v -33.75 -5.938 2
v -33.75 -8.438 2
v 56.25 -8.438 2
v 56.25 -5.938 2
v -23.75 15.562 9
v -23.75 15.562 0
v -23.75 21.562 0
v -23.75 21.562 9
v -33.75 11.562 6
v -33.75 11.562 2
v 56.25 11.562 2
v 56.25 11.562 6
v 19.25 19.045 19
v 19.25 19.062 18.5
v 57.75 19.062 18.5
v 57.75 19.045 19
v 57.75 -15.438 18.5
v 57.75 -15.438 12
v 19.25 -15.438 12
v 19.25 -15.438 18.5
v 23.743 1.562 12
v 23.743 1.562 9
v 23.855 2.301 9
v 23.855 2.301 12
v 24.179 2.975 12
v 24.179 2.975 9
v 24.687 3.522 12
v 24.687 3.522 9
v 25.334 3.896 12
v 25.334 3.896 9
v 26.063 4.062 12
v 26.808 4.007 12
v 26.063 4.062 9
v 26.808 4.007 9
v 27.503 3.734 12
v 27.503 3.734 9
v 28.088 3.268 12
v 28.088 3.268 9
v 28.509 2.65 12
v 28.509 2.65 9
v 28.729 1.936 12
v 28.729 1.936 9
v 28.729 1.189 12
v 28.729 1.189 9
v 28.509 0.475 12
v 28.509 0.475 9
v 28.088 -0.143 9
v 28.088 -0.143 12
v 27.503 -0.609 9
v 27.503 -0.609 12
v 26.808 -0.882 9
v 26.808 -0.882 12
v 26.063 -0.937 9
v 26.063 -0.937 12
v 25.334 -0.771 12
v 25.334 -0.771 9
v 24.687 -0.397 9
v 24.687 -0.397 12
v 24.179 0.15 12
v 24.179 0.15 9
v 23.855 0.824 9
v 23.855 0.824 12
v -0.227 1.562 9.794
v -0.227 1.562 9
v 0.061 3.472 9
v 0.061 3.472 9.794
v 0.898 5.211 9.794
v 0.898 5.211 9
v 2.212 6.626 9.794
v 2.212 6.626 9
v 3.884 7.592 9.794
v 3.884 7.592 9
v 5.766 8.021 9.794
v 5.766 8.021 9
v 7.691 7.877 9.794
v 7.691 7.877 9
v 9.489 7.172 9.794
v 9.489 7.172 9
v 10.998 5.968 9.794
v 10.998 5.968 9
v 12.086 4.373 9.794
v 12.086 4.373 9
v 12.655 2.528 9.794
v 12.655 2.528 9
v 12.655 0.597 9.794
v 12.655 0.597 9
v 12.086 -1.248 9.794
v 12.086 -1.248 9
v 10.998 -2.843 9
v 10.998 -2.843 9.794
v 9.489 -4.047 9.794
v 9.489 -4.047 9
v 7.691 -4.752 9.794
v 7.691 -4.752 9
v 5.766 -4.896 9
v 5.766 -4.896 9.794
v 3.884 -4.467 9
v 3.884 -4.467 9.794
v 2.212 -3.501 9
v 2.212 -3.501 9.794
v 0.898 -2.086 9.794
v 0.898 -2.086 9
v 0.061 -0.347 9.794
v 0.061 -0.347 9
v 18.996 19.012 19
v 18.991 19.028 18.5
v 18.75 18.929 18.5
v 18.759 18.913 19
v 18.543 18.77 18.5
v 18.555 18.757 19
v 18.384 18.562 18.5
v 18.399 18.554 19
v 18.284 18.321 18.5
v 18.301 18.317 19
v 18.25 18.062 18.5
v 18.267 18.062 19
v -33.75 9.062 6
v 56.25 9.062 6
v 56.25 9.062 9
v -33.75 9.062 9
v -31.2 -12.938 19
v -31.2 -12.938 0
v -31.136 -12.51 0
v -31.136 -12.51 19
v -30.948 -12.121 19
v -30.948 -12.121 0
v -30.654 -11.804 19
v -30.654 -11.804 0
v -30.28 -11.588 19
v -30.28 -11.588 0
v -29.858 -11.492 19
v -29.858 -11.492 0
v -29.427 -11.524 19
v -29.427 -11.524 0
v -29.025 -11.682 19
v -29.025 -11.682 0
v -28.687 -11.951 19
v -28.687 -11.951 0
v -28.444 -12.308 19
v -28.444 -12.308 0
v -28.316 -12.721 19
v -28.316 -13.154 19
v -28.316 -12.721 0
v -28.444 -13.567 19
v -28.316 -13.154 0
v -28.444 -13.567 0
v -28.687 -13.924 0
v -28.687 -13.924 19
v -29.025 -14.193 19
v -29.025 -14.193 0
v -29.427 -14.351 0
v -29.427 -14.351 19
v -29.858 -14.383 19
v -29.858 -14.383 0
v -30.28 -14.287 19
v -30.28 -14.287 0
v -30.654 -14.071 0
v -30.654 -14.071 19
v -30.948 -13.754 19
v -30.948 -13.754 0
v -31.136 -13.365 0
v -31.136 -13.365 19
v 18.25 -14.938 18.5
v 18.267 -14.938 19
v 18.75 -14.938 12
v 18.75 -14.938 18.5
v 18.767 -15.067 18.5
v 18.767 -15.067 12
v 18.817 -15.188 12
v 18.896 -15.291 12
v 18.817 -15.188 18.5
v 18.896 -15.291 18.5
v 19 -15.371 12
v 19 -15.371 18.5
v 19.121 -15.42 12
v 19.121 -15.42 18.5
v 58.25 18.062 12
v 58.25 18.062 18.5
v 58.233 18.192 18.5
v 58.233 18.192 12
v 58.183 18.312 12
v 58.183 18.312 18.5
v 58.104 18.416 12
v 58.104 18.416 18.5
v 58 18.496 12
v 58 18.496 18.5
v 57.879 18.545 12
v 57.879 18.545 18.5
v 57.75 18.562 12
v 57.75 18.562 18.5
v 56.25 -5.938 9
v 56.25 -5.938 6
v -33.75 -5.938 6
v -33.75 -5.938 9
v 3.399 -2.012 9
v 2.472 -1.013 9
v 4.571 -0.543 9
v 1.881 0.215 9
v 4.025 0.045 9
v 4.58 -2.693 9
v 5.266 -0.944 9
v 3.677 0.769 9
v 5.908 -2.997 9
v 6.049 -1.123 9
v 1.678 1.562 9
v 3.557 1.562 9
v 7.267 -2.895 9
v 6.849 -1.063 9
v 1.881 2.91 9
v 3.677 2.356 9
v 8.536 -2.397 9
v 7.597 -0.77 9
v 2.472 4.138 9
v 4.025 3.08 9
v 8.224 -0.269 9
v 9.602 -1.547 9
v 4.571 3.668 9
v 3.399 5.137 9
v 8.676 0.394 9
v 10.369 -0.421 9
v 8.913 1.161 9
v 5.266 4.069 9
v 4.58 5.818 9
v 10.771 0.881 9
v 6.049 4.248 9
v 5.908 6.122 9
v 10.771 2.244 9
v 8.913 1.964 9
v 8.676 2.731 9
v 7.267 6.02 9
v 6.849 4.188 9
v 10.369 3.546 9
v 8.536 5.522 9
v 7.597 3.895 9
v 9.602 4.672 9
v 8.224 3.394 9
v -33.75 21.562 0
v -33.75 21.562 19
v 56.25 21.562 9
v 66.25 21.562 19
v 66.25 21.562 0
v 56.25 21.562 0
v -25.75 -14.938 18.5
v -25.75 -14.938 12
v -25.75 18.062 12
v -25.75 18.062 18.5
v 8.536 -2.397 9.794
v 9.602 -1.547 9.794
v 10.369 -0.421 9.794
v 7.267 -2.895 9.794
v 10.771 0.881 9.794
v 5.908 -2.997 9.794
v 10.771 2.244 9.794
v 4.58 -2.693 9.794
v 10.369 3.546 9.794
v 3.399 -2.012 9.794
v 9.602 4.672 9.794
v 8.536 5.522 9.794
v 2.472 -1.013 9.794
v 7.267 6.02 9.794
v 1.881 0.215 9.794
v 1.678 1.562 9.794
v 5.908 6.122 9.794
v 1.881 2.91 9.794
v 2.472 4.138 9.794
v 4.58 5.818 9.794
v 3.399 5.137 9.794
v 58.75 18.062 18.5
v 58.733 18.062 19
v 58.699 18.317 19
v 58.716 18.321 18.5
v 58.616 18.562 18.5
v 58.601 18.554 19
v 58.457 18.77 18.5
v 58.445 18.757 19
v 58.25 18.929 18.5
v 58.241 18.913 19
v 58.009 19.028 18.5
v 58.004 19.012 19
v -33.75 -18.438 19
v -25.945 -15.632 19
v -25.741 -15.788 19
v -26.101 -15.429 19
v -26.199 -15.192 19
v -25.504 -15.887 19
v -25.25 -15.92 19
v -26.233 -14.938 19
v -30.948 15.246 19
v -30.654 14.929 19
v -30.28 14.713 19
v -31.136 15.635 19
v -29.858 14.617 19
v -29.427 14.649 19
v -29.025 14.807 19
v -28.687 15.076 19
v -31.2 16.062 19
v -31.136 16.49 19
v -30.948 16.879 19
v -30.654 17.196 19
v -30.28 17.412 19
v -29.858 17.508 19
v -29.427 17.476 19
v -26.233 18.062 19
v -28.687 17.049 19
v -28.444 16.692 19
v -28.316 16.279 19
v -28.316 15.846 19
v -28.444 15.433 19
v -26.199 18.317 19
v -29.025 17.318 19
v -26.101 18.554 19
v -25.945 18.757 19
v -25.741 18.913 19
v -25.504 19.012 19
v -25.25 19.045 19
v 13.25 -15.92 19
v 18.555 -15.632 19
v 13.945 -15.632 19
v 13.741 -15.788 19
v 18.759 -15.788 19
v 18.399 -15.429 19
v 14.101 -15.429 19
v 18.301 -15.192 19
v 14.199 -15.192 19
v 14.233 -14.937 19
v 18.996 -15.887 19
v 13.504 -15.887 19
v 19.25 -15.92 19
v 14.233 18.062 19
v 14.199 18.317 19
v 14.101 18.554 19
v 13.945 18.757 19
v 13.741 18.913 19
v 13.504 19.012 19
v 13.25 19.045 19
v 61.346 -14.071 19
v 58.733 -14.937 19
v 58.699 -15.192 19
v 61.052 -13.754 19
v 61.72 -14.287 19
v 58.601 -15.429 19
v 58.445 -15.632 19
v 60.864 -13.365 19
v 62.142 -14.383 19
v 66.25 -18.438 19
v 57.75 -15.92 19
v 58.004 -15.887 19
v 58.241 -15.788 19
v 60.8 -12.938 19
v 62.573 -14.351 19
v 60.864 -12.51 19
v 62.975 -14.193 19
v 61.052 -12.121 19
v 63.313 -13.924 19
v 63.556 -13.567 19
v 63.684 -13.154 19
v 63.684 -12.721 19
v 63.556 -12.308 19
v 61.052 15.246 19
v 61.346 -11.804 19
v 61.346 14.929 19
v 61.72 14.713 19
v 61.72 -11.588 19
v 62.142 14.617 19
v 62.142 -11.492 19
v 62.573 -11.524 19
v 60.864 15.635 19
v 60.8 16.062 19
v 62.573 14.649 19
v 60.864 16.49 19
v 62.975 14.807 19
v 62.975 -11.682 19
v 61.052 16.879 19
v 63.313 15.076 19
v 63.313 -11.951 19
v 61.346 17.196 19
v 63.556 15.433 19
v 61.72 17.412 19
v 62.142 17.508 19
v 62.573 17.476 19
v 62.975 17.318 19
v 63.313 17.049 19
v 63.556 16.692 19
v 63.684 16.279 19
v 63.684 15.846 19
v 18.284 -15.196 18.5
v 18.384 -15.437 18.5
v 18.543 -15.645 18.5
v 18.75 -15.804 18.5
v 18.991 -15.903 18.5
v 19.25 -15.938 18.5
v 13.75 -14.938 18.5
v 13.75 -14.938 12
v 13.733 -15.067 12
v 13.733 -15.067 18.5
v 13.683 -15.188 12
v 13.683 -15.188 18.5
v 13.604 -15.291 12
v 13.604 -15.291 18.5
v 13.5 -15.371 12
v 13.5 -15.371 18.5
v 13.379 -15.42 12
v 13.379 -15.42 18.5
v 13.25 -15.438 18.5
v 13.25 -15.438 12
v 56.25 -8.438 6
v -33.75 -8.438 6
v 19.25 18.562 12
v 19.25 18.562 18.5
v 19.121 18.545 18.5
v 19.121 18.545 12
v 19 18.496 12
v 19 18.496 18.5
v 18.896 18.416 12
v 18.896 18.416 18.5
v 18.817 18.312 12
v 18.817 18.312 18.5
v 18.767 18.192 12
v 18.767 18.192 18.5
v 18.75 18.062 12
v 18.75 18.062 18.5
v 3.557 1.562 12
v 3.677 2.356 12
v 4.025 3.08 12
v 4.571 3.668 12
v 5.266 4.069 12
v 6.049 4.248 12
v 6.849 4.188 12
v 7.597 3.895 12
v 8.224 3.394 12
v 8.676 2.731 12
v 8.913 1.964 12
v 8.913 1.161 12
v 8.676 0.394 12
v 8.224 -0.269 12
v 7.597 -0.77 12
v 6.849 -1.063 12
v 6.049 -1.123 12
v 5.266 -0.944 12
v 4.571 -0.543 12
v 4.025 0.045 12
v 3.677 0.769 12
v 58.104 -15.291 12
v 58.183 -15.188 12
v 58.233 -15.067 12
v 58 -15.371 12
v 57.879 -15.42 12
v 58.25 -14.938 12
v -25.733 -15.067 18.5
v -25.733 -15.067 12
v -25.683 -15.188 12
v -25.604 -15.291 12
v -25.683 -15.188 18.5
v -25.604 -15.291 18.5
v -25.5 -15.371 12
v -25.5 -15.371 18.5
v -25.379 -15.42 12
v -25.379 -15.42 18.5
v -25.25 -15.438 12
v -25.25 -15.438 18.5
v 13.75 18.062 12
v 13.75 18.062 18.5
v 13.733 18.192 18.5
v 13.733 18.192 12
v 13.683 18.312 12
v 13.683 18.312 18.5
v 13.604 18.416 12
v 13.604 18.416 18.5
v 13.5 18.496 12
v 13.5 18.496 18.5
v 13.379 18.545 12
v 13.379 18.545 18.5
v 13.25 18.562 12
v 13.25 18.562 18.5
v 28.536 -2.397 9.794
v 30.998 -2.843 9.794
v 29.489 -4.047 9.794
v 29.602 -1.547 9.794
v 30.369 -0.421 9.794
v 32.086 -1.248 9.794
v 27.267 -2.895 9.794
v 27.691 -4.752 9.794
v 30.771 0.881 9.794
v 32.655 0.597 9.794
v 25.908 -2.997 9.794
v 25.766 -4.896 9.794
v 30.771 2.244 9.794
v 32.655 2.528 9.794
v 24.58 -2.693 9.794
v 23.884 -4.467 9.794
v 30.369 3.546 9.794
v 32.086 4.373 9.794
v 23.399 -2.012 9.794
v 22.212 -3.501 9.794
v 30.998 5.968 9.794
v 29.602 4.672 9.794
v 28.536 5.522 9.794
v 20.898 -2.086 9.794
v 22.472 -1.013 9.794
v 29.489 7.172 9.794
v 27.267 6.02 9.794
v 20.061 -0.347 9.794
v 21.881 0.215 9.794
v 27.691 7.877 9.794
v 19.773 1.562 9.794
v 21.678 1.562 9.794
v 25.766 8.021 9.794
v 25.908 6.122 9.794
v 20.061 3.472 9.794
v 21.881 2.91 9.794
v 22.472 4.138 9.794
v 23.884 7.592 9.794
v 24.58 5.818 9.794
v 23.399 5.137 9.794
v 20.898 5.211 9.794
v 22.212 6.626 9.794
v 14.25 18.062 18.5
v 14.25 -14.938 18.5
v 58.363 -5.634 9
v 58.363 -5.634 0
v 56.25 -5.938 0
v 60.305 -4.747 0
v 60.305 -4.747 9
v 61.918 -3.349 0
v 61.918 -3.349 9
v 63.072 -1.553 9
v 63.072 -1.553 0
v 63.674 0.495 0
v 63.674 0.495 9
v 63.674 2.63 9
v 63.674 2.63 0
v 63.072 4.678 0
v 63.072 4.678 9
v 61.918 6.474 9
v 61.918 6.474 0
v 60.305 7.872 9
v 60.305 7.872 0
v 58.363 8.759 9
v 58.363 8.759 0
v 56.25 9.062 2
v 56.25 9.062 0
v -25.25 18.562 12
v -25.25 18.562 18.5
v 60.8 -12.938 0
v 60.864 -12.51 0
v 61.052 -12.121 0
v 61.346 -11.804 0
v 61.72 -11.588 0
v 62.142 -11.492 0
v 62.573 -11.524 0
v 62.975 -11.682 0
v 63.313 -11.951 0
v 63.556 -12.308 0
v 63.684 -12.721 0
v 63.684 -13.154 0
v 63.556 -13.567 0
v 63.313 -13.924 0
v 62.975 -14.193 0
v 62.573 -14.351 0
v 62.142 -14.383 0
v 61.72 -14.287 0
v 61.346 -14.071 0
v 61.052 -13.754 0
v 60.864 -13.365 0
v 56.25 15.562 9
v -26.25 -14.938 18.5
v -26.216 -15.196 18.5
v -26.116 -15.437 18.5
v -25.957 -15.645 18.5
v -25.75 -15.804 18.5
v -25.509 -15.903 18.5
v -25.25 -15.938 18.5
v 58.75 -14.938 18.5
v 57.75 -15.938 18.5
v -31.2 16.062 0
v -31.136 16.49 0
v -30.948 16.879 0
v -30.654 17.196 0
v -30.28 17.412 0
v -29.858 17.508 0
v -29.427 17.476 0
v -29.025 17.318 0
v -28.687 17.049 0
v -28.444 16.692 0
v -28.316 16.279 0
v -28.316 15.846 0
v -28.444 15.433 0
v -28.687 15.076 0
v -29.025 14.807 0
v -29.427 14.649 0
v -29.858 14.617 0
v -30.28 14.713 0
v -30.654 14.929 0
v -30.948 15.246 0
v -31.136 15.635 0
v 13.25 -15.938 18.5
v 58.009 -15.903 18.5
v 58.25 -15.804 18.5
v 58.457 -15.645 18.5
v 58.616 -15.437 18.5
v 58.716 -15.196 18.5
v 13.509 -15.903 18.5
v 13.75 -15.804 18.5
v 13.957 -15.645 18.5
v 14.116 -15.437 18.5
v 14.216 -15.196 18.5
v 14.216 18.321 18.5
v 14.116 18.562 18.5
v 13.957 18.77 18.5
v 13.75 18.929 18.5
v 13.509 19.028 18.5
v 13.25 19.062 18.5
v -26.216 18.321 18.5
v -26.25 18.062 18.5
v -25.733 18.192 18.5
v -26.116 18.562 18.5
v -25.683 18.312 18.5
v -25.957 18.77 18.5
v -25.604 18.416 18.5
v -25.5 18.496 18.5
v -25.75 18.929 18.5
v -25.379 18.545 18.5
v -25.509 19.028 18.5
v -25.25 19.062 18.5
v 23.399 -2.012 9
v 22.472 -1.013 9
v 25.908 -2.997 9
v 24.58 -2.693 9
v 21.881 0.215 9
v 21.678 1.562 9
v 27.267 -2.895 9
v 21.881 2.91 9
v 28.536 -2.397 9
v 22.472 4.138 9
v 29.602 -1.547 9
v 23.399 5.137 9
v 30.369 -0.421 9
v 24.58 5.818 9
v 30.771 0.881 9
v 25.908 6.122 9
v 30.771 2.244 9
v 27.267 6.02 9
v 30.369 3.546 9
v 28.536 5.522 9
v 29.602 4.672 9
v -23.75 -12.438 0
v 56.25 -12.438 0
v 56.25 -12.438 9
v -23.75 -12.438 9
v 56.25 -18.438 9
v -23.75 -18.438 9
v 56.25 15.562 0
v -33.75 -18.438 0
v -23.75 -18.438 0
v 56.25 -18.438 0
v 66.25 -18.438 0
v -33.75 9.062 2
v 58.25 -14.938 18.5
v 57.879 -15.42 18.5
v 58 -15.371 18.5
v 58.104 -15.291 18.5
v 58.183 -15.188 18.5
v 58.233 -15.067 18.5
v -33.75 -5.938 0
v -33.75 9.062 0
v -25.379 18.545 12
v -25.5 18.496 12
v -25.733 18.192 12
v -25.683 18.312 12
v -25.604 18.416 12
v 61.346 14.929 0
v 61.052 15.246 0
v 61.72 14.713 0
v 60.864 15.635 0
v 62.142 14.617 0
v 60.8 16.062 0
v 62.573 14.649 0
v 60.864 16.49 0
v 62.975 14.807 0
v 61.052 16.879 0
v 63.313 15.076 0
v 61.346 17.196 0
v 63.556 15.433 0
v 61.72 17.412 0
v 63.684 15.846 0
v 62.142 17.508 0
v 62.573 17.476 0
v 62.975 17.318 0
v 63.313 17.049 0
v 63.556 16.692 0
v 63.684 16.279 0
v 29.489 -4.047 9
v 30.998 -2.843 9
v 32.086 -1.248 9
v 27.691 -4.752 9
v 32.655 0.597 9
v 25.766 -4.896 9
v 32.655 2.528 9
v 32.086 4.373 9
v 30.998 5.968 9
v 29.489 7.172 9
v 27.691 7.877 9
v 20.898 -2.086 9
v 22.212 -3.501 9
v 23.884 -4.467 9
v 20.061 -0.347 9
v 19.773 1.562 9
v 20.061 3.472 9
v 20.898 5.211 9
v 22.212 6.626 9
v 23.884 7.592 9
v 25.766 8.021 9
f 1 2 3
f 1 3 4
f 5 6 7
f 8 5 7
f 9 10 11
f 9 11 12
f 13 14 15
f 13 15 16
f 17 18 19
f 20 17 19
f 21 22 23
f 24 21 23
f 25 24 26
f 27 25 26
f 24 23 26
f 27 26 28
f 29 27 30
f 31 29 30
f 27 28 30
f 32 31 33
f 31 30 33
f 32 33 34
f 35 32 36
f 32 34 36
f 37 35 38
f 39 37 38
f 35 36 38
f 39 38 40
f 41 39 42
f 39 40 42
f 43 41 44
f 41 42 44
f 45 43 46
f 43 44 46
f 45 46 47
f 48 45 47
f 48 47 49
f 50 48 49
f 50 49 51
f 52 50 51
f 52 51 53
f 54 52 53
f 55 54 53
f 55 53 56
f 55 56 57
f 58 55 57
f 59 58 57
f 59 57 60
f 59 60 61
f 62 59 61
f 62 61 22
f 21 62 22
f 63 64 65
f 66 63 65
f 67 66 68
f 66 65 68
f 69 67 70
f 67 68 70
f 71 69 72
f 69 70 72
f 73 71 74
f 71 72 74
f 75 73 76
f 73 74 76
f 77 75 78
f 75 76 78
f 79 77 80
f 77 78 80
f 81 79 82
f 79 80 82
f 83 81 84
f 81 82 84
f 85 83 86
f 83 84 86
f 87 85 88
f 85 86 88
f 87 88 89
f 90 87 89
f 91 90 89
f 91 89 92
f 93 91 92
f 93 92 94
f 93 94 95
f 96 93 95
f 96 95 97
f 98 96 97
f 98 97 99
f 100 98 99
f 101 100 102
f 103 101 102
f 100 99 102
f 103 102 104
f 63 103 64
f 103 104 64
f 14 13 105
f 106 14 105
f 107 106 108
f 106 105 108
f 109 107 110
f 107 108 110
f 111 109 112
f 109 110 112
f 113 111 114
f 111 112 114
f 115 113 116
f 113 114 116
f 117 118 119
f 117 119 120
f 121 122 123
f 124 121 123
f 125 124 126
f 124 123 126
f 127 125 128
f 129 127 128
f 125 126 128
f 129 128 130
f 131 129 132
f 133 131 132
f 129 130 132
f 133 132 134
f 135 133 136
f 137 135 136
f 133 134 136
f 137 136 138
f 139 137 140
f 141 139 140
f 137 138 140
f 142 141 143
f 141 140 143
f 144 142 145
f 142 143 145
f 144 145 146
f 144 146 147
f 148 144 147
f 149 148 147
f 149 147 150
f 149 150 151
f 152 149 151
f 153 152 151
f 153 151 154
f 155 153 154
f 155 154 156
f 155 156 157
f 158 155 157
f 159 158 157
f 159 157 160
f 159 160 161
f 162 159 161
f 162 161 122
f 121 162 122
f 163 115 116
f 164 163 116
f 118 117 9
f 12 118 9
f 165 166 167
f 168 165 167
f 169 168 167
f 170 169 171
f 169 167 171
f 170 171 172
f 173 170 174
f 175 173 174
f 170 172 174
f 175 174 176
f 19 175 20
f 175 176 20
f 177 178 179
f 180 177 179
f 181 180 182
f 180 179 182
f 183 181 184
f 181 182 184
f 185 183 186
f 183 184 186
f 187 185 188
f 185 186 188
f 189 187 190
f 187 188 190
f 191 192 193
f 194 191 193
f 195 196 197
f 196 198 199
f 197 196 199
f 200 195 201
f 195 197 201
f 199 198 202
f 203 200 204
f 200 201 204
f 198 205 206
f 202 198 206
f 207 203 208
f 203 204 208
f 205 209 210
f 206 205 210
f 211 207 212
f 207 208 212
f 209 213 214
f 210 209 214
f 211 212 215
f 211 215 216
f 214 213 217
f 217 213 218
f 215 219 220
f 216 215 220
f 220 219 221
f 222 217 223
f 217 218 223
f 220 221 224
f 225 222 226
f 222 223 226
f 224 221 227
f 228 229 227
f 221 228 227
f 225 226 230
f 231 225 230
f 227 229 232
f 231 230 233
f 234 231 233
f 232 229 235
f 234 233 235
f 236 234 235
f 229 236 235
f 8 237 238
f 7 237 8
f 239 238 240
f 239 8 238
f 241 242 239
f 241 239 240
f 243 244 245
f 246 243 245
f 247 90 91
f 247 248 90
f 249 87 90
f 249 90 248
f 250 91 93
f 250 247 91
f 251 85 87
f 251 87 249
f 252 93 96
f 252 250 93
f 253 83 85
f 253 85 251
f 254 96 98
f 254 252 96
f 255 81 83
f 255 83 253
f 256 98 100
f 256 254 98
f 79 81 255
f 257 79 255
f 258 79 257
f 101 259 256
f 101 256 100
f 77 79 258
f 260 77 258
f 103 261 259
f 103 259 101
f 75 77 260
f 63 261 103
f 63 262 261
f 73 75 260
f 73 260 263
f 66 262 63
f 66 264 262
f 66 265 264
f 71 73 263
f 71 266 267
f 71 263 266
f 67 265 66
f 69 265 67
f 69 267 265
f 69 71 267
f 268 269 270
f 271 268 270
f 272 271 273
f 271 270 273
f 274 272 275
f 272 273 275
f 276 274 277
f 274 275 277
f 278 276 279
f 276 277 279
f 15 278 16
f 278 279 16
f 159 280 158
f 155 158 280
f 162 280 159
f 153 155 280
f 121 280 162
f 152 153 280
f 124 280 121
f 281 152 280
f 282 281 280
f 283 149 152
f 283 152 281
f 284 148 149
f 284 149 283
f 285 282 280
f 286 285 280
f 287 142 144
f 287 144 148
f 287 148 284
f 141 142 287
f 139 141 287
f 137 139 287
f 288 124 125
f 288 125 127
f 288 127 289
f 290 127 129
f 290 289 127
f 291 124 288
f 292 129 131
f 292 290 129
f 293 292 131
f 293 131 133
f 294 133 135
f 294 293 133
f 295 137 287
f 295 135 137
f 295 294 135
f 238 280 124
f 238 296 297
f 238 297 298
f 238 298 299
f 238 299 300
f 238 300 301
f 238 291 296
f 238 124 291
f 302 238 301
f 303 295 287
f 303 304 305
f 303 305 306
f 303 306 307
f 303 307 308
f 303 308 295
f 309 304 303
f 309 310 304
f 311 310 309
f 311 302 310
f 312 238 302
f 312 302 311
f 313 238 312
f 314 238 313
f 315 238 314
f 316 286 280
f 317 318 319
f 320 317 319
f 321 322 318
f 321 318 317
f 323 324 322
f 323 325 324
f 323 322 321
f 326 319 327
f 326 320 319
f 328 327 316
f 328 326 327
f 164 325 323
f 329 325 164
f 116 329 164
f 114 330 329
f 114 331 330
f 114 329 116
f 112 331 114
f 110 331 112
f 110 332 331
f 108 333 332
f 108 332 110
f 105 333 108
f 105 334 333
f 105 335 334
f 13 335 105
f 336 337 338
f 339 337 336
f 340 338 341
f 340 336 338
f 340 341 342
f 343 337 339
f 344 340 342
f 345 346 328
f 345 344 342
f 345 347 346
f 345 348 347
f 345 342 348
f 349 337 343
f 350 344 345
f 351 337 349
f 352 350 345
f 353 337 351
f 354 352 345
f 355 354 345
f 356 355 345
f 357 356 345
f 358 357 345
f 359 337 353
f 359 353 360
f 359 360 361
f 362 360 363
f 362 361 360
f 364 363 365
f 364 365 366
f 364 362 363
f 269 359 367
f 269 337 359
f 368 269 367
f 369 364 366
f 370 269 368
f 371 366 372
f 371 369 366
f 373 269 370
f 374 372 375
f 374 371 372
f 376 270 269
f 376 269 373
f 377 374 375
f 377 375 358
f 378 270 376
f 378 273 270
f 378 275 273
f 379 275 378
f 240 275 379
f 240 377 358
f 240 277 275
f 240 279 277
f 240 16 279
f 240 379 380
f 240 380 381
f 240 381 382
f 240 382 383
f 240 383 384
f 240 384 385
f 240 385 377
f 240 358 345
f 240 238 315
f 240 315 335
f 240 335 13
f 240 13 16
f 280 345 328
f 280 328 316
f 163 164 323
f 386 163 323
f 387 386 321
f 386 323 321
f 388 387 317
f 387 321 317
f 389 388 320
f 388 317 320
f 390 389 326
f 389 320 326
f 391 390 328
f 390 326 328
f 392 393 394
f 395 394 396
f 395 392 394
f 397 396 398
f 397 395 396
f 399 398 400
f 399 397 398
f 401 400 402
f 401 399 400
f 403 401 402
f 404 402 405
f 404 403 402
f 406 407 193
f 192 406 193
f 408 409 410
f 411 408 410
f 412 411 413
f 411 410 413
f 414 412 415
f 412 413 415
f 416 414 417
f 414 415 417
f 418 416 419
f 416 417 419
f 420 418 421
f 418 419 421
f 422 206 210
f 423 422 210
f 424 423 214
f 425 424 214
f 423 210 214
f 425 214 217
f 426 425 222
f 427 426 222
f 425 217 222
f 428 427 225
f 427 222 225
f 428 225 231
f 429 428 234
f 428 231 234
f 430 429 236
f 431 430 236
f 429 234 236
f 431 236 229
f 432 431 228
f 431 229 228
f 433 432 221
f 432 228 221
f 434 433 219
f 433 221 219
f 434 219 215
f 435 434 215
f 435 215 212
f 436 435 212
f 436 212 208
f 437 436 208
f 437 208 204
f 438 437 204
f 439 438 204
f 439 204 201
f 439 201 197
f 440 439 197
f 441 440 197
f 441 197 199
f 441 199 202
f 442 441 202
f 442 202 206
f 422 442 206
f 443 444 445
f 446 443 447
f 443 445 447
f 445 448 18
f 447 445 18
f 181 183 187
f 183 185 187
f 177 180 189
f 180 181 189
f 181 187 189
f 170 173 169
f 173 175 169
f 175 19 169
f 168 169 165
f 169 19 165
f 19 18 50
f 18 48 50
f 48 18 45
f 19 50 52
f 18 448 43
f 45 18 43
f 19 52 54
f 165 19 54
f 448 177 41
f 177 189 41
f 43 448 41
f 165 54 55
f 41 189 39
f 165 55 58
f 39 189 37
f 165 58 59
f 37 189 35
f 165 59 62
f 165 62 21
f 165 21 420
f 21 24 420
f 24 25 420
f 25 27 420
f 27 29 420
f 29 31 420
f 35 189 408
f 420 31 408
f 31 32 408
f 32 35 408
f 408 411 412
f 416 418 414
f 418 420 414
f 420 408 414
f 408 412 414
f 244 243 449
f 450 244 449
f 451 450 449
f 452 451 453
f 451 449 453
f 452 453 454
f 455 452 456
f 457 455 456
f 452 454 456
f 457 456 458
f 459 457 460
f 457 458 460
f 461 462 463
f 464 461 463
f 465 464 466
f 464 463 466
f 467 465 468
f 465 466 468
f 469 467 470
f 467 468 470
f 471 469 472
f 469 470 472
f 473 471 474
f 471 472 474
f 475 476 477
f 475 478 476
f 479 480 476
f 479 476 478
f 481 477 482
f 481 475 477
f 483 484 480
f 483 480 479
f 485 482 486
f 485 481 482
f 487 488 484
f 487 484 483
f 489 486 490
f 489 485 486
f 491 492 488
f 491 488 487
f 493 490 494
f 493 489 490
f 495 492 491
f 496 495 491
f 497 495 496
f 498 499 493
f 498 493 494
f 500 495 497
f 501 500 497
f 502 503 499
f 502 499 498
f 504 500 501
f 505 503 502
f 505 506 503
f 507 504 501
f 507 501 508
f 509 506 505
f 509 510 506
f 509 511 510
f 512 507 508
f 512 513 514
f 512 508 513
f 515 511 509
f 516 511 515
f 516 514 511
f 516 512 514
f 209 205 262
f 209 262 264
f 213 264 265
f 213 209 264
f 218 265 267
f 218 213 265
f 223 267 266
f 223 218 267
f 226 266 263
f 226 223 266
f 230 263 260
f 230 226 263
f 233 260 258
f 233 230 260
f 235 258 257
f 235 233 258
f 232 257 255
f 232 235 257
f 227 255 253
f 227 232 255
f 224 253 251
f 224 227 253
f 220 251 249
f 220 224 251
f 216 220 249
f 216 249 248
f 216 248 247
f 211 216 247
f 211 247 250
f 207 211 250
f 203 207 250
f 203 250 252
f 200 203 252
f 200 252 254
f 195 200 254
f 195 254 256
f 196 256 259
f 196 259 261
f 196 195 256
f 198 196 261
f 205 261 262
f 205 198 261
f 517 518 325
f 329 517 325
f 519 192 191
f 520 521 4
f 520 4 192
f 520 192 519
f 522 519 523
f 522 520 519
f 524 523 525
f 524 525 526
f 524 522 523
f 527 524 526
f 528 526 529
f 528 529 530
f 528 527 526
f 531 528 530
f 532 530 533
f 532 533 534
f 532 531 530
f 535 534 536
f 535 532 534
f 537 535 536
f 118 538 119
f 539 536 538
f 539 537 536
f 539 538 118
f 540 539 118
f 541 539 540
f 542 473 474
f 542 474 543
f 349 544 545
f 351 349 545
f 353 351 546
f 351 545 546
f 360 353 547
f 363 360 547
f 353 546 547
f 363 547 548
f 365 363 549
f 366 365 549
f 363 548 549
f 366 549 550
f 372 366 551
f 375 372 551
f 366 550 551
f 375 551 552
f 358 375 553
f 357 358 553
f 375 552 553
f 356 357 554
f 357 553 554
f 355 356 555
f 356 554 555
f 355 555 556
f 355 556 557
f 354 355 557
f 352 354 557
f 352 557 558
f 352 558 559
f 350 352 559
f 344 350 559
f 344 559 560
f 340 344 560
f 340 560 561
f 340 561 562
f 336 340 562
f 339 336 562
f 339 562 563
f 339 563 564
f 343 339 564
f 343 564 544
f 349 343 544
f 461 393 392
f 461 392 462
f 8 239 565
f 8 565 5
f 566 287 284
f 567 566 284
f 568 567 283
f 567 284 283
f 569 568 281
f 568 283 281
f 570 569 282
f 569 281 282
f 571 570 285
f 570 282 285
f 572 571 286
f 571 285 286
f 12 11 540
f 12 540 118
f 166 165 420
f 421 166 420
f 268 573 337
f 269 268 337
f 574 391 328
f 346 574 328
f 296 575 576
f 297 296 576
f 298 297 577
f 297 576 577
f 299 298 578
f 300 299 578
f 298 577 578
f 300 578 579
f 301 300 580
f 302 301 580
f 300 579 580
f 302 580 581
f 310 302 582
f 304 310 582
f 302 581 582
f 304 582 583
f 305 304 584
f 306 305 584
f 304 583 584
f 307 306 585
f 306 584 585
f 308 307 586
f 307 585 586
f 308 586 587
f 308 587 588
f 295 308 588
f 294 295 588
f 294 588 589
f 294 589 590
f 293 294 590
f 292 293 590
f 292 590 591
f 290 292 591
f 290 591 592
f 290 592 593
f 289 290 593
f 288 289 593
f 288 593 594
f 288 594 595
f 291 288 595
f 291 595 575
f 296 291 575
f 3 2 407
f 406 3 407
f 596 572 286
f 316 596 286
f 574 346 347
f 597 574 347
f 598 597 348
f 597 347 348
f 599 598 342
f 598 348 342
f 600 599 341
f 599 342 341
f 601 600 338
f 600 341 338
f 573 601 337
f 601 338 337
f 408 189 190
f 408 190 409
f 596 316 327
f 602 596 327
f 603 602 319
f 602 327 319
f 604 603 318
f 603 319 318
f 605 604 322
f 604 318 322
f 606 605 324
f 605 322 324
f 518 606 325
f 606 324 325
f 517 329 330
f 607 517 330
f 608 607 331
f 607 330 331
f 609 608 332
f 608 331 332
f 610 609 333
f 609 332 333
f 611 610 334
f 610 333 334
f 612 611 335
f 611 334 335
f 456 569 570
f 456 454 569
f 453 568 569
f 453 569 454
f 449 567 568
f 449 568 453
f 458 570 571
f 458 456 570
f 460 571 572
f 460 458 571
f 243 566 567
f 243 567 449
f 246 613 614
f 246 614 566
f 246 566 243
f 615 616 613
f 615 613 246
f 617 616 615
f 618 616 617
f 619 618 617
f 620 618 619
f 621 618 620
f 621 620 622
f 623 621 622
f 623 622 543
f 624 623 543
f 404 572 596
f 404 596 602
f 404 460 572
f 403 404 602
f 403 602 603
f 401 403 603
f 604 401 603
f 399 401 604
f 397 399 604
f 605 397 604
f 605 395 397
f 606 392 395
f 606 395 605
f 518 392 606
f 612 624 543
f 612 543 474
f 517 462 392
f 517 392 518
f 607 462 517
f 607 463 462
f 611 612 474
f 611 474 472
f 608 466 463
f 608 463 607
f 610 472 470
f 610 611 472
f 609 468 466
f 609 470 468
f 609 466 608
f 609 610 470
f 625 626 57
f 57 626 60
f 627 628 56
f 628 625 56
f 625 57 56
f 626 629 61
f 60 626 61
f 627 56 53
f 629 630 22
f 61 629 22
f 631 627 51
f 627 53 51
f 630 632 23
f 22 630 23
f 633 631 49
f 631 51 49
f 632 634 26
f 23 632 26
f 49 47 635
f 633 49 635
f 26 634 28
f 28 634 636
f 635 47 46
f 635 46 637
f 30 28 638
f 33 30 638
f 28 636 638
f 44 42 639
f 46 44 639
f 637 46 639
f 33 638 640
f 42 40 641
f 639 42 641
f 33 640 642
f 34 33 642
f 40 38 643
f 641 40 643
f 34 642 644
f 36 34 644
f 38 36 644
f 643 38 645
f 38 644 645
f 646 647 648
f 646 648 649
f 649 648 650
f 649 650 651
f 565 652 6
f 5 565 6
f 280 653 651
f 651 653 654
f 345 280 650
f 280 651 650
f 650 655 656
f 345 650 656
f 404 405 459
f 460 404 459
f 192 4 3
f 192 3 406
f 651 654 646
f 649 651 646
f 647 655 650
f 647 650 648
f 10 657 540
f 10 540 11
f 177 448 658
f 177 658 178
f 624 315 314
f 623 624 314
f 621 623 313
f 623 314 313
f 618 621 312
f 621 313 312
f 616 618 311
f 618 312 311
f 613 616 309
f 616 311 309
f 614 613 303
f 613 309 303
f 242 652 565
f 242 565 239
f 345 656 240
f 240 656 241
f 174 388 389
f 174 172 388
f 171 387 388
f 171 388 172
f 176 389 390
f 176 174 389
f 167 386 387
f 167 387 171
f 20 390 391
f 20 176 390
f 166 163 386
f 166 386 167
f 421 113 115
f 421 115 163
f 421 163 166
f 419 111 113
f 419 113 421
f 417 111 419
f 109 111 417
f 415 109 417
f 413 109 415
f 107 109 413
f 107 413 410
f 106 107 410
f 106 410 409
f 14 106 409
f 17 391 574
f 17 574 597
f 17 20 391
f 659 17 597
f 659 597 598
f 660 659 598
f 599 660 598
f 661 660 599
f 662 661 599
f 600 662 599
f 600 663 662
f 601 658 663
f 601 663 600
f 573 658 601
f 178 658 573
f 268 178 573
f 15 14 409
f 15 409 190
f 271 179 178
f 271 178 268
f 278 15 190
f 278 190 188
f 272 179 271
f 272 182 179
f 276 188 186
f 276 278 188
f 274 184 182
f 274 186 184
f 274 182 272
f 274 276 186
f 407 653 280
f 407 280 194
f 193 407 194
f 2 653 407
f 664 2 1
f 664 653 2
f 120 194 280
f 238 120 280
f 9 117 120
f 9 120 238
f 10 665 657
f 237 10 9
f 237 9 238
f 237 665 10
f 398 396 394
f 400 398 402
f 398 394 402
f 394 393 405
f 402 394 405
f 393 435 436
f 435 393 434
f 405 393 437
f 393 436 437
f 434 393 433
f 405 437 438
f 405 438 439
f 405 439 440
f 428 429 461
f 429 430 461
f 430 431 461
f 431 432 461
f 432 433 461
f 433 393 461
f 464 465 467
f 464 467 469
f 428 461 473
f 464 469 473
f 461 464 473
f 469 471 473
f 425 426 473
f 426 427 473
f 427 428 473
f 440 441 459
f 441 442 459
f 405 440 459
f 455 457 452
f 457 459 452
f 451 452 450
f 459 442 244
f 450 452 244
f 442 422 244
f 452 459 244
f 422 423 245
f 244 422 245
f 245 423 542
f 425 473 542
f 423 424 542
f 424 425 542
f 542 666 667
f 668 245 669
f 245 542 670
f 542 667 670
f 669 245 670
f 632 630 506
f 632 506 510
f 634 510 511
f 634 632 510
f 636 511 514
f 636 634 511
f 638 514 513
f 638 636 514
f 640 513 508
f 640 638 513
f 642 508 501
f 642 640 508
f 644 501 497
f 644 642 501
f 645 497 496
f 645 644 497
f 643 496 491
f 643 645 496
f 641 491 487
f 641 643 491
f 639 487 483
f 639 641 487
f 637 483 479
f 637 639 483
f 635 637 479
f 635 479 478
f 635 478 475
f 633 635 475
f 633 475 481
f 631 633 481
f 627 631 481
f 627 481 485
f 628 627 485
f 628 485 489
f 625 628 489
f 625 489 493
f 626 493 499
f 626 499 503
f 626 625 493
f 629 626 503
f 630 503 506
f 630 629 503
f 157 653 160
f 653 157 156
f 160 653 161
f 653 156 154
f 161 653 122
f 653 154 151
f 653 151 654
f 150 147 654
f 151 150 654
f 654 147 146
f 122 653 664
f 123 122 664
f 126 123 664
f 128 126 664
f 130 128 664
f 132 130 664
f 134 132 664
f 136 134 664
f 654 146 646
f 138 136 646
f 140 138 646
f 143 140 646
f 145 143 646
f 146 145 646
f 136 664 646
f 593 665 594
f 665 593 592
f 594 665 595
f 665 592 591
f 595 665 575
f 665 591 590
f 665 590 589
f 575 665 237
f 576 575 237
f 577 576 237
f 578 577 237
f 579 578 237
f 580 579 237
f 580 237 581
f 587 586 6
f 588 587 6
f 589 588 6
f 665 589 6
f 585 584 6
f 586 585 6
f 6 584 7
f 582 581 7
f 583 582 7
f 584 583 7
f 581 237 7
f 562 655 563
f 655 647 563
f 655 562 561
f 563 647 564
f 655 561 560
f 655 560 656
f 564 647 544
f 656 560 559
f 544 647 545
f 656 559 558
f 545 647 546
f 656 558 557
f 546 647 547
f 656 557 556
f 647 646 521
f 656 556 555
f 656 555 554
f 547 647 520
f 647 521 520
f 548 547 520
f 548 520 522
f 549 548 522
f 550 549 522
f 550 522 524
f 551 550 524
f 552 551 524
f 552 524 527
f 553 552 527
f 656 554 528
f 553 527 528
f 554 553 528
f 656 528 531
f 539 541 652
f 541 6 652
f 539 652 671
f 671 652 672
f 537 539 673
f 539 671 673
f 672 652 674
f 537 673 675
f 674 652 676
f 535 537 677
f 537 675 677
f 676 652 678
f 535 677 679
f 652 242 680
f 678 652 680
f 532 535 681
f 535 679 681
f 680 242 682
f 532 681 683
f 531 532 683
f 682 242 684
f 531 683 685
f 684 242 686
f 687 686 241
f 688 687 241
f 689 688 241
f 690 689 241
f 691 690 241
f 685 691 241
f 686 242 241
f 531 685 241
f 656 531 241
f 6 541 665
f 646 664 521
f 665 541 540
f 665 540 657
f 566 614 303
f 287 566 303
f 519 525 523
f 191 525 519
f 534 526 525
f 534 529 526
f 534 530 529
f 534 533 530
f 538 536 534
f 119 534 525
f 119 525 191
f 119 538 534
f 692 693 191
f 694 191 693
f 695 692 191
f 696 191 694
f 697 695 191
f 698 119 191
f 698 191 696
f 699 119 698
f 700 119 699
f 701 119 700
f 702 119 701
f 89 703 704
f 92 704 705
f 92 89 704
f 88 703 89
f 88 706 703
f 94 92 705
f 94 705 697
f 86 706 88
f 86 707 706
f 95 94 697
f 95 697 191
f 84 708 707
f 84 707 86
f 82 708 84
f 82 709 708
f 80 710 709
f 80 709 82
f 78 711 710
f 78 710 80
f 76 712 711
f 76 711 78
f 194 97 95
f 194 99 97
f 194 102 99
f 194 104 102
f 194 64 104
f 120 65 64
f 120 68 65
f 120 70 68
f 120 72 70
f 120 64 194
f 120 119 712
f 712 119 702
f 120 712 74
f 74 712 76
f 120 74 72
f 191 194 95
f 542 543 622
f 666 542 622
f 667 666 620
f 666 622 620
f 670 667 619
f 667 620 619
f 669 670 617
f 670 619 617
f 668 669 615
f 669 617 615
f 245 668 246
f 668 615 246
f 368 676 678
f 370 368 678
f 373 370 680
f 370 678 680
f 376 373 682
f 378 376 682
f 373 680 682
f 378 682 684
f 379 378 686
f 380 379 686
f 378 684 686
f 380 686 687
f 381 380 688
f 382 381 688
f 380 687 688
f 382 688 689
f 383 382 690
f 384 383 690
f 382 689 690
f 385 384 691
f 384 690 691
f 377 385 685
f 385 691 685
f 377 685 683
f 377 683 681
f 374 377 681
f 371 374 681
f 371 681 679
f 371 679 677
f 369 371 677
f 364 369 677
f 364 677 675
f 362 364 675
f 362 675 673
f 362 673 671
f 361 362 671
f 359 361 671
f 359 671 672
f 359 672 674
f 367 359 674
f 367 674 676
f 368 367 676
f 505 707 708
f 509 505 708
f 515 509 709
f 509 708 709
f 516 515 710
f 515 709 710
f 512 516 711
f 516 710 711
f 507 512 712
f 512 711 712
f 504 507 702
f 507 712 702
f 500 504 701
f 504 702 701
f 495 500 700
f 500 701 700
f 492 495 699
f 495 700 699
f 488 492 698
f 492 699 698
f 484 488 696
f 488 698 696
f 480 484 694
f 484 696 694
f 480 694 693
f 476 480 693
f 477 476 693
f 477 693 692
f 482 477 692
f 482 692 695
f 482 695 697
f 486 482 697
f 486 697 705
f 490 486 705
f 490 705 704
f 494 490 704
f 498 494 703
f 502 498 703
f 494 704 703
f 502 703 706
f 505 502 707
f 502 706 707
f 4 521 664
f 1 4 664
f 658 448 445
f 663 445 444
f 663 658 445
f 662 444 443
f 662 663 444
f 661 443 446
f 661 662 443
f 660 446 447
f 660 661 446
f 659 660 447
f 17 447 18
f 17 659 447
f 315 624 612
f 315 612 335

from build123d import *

# Parameters (mm, degrees)
SKETCH1_W           = 100
SKETCH1_H           = 40
BOSS_EXTRUDE1_DEPTH = 38
CUT_EXTRUDE2_START  = -12
SKETCH2_W           = 39.5
SKETCH2_H           = 34
CUT_EXTRUDE2_DEPTH  = 21
CUT_EXTRUDE4_REACH  = 81.36
SKETCH4_R           = 1.45
SKETCH6_W           = 100
SKETCH6_H           = 19
CUT_EXTRUDE5_DEPTH  = 87.215210375
FILLET1_R           = 0.5
CUT_EXTRUDE6_START  = 6.5
CUT_EXTRUDE6_DEPTH  = 0.5
CUT_EXTRUDE6_TAPER  = 2
CUT_EXTRUDE7_START  = 6.5
CUT_EXTRUDE7_DEPTH  = 0.5
CUT_EXTRUDE7_TAPER  = 2
CUT_EXTRUDE12_DEPTH = 9
CUT_EXTRUDE13_REACH = 72.385
SKETCH18_R          = 2.506862912
SKETCH18_R_2        = 2.693115416
SKETCH19_R          = 6.477
SKETCH19_R_2        = 4.572
CUT_EXTRUDE14_DEPTH = 0.79375
SKETCH21_W          = 10
SKETCH21_H          = 15
CUT_EXTRUDE15_DEPTH = 9
SKETCH22_W          = 4
SKETCH22_H          = 2.5
CUT_EXTRUDE16_DEPTH = 90
SKETCH23_W          = 80
SKETCH23_H          = 6
CUT_EXTRUDE17_DEPTH = 9


with BuildPart() as part:
    # Sketch1 → Boss-Extrude1 (new body)
    with BuildSketch(Plane.XY):
        with Locations((16.25, 1.5625)):
            Rectangle(SKETCH1_W, SKETCH1_H)
    extrude(amount=BOSS_EXTRUDE1_DEPTH)

    # Sketch2 → Cut-Extrude2 (cut)
    with BuildSketch(Plane(origin=(0, 0, 0), x_dir=(-1, 0, 0), z_dir=(0, 0, -1)).offset(CUT_EXTRUDE2_START)):
        with Locations((-38.5, 1.5625)):
            Rectangle(SKETCH2_W, SKETCH2_H)
        with Locations((6, 1.5625)):
            Rectangle(SKETCH2_W, SKETCH2_H)
    extrude(amount=-CUT_EXTRUDE2_DEPTH, mode=Mode.SUBTRACT)

    # Sketch4 → Cut-Extrude4 (cut, up to next)
    with BuildSketch(Plane(origin=(0, 0, 0), x_dir=(-1, 0, 0), z_dir=(0, 0, -1)), mode=Mode.PRIVATE) as cut_extrude4_sk1:
        with Locations((-62.25, 16.0625)):
            Circle(SKETCH4_R)
    cut_extrude4_tool1 = extrude(cut_extrude4_sk1.sketch, amount=-CUT_EXTRUDE4_REACH, mode=Mode.PRIVATE) & part.part
    # Sketch4 → Cut-Extrude4 (cut, up to next)
    with BuildSketch(Plane(origin=(0, 0, 0), x_dir=(-1, 0, 0), z_dir=(0, 0, -1)), mode=Mode.PRIVATE) as cut_extrude4_sk2:
        with Locations((-62.25, -12.9375)):
            Circle(SKETCH4_R)
    cut_extrude4_tool2 = extrude(cut_extrude4_sk2.sketch, amount=-CUT_EXTRUDE4_REACH, mode=Mode.PRIVATE) & part.part
    # Sketch4 → Cut-Extrude4 (cut, up to next)
    with BuildSketch(Plane(origin=(0, 0, 0), x_dir=(-1, 0, 0), z_dir=(0, 0, -1)), mode=Mode.PRIVATE) as cut_extrude4_sk3:
        with Locations((29.75, 16.0625)):
            Circle(SKETCH4_R)
    cut_extrude4_tool3 = extrude(cut_extrude4_sk3.sketch, amount=-CUT_EXTRUDE4_REACH, mode=Mode.PRIVATE) & part.part
    # Sketch4 → Cut-Extrude4 (cut, up to next)
    with BuildSketch(Plane(origin=(0, 0, 0), x_dir=(-1, 0, 0), z_dir=(0, 0, -1)), mode=Mode.PRIVATE) as cut_extrude4_sk4:
        with Locations((29.75, -12.9375)):
            Circle(SKETCH4_R)
    cut_extrude4_tool4 = extrude(cut_extrude4_sk4.sketch, amount=-CUT_EXTRUDE4_REACH, mode=Mode.PRIVATE) & part.part
    add(cut_extrude4_tool1.solids().sort_by_distance((62.25, 16.0625, 0))[0], mode=Mode.SUBTRACT)
    add(cut_extrude4_tool2.solids().sort_by_distance((62.25, -12.9375, 0))[0], mode=Mode.SUBTRACT)
    add(cut_extrude4_tool3.solids().sort_by_distance((-29.75, 16.0625, 0))[0], mode=Mode.SUBTRACT)
    add(cut_extrude4_tool4.solids().sort_by_distance((-29.75, -12.9375, 0))[0], mode=Mode.SUBTRACT)

    # Sketch6 → Cut-Extrude5 (cut, through all)
    with BuildSketch(Plane(origin=(0, 21.5625, 0), x_dir=(1, 0, 0), z_dir=(0, 1, 0))):
        with Locations((16.25, -28.5)):
            Rectangle(SKETCH6_W, SKETCH6_H)
    extrude(amount=-CUT_EXTRUDE5_DEPTH, mode=Mode.SUBTRACT)

    # Fillet1
    fillet1_edges = [part.edges().sort_by_distance(p)[0] for p in [
        (-25.75, -15.4375, 15.5),
        (13.75, -15.4375, 15.5),
        (-25.75, 18.5625, 15.5),
        (13.75, 18.5625, 15.5),
        (18.75, -15.4375, 15.5),
        (58.25, -15.4375, 15.5),
        (18.75, 18.5625, 15.5),
        (58.25, 18.5625, 15.5),
    ]]
    fillet(fillet1_edges, radius=FILLET1_R)

    # Sketch10 → Cut-Extrude6 (cut)
    with BuildSketch(Plane.XY.offset(12).offset(CUT_EXTRUDE6_START)):
        with BuildLine():
            Line((14.25, -14.9375), (14.25, 18.0625))
            ThreePointArc((14.25, 18.0625), (13.957106781, 18.769606781), (13.25, 19.0625))
            Line((13.25, 19.0625), (-25.25, 19.0625))
            ThreePointArc((-25.25, 19.0625), (-25.957106781, 18.769606781), (-26.25, 18.0625))
            Line((-26.25, 18.0625), (-26.25, -14.9375))
            ThreePointArc((-26.25, -14.9375), (-25.957106781, -15.644606781), (-25.25, -15.9375))
            Line((-25.25, -15.9375), (13.25, -15.9375))
            ThreePointArc((13.25, -15.9375), (13.957106781, -15.644606781), (14.25, -14.9375))
        make_face()
    extrude(amount=CUT_EXTRUDE6_DEPTH, taper=CUT_EXTRUDE6_TAPER, mode=Mode.SUBTRACT)

    # Sketch11 → Cut-Extrude7 (cut)
    with BuildSketch(Plane.XY.offset(12).offset(CUT_EXTRUDE7_START)):
        with BuildLine():
            Line((58.75, -14.9375), (58.75, 18.0625))
            ThreePointArc((58.75, 18.0625), (58.457106781, 18.769606781), (57.75, 19.0625))
            Line((57.75, 19.0625), (19.25, 19.0625))
            ThreePointArc((19.25, 19.0625), (18.542893219, 18.769606781), (18.25, 18.0625))
            Line((18.25, 18.0625), (18.25, -14.9375))
            ThreePointArc((18.25, -14.9375), (18.542893219, -15.644606781), (19.25, -15.9375))
            Line((19.25, -15.9375), (57.75, -15.9375))
            ThreePointArc((57.75, -15.9375), (58.457106781, -15.644606781), (58.75, -14.9375))
        make_face()
    extrude(amount=CUT_EXTRUDE7_DEPTH, taper=CUT_EXTRUDE7_TAPER, mode=Mode.SUBTRACT)

    # Sketch17 → Cut-Extrude12 (cut)
    with BuildSketch(Plane(origin=(0, 0, 0), x_dir=(-1, 0, 0), z_dir=(0, 0, -1))):
        with BuildLine():
            Line((-56.25, 9.0625), (23.75, 9.0625))
            ThreePointArc((23.75, 9.0625), (31.25, 1.5625), (23.75, -5.9375))
            Line((23.75, -5.9375), (-56.25, -5.9375))
            ThreePointArc((-56.25, -5.9375), (-63.75, 1.5625), (-56.25, 9.0625))
        make_face()
    extrude(amount=-CUT_EXTRUDE12_DEPTH, mode=Mode.SUBTRACT)

    # Sketch18 → Cut-Extrude13 (cut, up to next)
    with BuildSketch(Plane(origin=(0, 0, 9), x_dir=(-1, 0, 0), z_dir=(0, 0, -1)), mode=Mode.PRIVATE) as cut_extrude13_sk1:
        with Locations((-26.25, 1.5625)):
            Circle(SKETCH18_R)
    cut_extrude13_tool1 = extrude(cut_extrude13_sk1.sketch, amount=-CUT_EXTRUDE13_REACH, mode=Mode.PRIVATE) & part.part
    # Sketch18 → Cut-Extrude13 (cut, up to next)
    with BuildSketch(Plane(origin=(0, 0, 9), x_dir=(-1, 0, 0), z_dir=(0, 0, -1)), mode=Mode.PRIVATE) as cut_extrude13_sk2:
        with Locations((-6.25, 1.5625)):
            Circle(SKETCH18_R_2)
    cut_extrude13_tool2 = extrude(cut_extrude13_sk2.sketch, amount=-CUT_EXTRUDE13_REACH, mode=Mode.PRIVATE) & part.part
    add(cut_extrude13_tool1.solids().sort_by_distance((26.25, 1.5625, 9))[0], mode=Mode.SUBTRACT)
    add(cut_extrude13_tool2.solids().sort_by_distance((6.25, 1.5625, 9))[0], mode=Mode.SUBTRACT)

    # Sketch19 → Cut-Extrude14 (cut)
    # profile 1 of 2: a face of its own
    with BuildSketch(Plane(origin=(0, 0, 9), x_dir=(-1, 0, 0), z_dir=(0, 0, -1))):
        with Locations((-26.25, 1.5625)):
            Circle(SKETCH19_R)
        with Locations((-26.25, 1.5625)):
            Circle(SKETCH19_R_2, mode=Mode.SUBTRACT)
    # profile 2 of 2: a face of its own
    with BuildSketch(Plane(origin=(0, 0, 9), x_dir=(-1, 0, 0), z_dir=(0, 0, -1))):
        with Locations((-6.25, 1.5625)):
            Circle(SKETCH19_R)
        with Locations((-6.25, 1.5625)):
            Circle(SKETCH19_R_2, mode=Mode.SUBTRACT)
    extrude(amount=-CUT_EXTRUDE14_DEPTH, mode=Mode.SUBTRACT)

    # Sketch21 → Cut-Extrude15 (cut)
    with BuildSketch(Plane(origin=(0, 0, 0), x_dir=(-1, 0, 0), z_dir=(0, 0, -1))):
        with Locations((28.75, 1.5625)):
            Rectangle(SKETCH21_W, SKETCH21_H)
    extrude(amount=-CUT_EXTRUDE15_DEPTH, mode=Mode.SUBTRACT)

    # Sketch22 → Cut-Extrude16 (cut)
    with BuildSketch(Plane.ZY.offset(33.75)):
        with Locations((4, 10.3125)):
            Rectangle(SKETCH22_W, SKETCH22_H)
        with Locations((4, -7.1875)):
            Rectangle(SKETCH22_W, SKETCH22_H)
    extrude(amount=-CUT_EXTRUDE16_DEPTH, mode=Mode.SUBTRACT)

    # Sketch23 → Cut-Extrude17 (cut)
    with BuildSketch(Plane(origin=(0, 0, 0), x_dir=(-1, 0, 0), z_dir=(0, 0, -1))):
        with Locations((-16.25, 18.5625)):
            Rectangle(SKETCH23_W, SKETCH23_H)
        with Locations((-16.25, -15.4375)):
            Rectangle(SKETCH23_W, SKETCH23_H)
    extrude(amount=-CUT_EXTRUDE17_DEPTH, mode=Mode.SUBTRACT)


solid = part.part
